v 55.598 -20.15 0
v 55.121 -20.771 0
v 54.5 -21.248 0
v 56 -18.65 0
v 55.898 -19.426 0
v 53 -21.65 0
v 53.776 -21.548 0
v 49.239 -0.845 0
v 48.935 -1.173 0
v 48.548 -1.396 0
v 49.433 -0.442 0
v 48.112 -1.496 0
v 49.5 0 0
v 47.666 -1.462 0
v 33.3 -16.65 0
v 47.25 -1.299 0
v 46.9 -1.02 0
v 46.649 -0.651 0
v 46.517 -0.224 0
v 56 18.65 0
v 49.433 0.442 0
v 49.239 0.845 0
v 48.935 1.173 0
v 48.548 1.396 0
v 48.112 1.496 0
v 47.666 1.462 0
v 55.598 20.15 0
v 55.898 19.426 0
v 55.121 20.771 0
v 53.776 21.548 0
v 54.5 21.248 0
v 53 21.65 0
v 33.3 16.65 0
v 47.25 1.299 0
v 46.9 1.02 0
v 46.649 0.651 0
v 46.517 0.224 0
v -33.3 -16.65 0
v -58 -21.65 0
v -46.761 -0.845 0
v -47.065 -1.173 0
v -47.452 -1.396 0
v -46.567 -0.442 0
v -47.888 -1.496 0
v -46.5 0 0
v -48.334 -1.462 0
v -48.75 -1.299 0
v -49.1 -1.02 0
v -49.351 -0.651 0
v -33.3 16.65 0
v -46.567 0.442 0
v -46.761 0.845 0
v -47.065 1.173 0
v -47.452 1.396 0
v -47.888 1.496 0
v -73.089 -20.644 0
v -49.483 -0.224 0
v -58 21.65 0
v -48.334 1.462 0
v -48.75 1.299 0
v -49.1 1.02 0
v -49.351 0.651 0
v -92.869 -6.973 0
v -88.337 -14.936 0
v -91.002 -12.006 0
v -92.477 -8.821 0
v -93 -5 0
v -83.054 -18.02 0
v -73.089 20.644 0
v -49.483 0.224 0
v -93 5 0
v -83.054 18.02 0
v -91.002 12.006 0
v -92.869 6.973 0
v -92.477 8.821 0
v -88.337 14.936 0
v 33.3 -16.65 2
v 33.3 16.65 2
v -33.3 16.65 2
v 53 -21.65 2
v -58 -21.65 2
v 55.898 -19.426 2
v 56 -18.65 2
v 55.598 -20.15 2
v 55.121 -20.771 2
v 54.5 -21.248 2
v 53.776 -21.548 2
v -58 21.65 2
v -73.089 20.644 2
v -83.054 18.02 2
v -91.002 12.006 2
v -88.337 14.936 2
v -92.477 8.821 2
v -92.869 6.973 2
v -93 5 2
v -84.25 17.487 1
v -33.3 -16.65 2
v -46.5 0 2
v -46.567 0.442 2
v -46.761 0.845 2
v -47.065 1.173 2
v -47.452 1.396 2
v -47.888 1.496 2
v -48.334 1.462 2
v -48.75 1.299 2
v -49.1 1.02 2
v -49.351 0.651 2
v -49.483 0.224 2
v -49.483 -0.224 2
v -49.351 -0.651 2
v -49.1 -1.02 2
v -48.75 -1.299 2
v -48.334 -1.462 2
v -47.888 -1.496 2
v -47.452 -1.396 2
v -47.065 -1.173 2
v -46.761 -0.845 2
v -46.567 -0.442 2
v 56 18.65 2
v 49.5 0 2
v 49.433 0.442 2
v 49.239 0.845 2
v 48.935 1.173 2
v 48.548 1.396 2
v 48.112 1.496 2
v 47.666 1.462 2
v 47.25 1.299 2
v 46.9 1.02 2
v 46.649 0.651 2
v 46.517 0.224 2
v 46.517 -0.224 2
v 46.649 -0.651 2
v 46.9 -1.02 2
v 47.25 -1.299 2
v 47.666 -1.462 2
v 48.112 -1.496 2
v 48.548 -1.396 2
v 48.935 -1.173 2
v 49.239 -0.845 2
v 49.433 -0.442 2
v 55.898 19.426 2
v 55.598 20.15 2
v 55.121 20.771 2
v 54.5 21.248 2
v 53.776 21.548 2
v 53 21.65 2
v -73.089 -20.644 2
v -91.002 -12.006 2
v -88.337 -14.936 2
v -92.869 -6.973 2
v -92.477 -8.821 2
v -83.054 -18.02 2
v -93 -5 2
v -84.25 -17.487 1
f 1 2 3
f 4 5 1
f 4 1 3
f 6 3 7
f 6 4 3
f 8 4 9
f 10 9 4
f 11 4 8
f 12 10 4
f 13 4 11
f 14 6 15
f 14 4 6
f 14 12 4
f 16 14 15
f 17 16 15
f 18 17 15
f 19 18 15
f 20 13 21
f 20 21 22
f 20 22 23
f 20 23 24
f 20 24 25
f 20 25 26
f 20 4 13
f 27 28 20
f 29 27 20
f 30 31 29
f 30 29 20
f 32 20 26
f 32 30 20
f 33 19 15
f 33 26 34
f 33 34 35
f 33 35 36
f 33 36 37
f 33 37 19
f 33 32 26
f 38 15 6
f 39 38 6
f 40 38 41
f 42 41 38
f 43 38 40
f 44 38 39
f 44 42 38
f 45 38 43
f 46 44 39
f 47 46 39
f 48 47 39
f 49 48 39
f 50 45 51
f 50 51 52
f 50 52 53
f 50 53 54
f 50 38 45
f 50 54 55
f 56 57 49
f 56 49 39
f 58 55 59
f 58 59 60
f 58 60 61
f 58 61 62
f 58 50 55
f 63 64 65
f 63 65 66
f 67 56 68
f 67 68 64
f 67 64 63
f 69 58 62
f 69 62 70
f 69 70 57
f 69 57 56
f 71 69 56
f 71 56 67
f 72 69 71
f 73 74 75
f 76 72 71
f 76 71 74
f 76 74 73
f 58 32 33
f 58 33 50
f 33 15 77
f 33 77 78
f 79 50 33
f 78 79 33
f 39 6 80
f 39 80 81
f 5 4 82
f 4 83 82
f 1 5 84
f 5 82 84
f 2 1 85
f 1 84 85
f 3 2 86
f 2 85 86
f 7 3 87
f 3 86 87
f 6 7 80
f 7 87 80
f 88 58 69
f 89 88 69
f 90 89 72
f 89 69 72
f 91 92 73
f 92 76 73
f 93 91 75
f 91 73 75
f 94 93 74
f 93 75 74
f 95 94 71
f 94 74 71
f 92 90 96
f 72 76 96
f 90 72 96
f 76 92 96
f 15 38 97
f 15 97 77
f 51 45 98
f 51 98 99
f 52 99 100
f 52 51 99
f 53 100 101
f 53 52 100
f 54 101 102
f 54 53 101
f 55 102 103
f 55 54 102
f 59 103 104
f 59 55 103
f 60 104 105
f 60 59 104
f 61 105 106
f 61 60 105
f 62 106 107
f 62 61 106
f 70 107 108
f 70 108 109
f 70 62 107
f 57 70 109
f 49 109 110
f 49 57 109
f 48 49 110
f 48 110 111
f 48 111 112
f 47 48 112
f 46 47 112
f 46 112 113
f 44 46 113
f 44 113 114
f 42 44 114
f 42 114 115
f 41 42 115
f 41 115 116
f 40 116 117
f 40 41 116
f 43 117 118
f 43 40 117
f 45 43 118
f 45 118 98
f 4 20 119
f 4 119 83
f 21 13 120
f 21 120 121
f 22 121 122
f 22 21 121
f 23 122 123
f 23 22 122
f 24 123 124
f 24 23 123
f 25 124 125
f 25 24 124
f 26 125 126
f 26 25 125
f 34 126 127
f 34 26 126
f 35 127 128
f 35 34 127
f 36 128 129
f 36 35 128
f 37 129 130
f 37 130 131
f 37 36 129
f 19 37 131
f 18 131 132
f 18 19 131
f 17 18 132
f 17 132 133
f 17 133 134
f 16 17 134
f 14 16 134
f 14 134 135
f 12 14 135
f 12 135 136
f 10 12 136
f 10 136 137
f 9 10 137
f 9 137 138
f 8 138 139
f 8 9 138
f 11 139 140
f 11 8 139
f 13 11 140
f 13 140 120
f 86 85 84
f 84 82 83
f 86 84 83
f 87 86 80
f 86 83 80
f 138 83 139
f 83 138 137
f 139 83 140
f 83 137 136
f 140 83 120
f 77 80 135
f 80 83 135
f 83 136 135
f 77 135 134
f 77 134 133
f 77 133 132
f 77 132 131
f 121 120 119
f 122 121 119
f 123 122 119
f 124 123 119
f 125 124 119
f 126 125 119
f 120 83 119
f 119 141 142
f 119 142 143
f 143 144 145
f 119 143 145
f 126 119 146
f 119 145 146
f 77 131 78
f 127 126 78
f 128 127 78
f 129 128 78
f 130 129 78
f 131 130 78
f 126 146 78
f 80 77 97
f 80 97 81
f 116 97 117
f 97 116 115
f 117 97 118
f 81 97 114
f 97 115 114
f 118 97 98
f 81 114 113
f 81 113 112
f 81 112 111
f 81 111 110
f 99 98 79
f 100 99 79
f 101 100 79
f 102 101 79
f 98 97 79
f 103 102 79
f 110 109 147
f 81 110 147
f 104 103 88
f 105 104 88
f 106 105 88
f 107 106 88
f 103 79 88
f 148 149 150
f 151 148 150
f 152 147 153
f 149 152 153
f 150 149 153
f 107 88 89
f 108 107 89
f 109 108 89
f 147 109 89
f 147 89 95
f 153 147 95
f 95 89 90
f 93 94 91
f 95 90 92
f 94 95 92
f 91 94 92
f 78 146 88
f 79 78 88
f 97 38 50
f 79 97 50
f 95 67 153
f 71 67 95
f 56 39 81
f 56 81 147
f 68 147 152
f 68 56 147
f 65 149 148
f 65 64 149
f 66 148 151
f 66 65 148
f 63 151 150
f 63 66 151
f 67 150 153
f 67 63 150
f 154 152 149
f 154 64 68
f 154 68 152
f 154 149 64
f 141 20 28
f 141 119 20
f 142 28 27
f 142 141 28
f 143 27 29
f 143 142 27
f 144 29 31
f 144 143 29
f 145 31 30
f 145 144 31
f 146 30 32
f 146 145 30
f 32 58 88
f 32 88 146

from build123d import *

# Parameters (mm, degrees)
SKETCH_W     = 66.6
SKETCH_H     = 33.3
SKETCH_R     = 1.5
PAD001_DEPTH = 2
FILLET001_R  = 3
FILLET002_R  = 3


with BuildPart() as part:
    # Sketch → Pad001 (new body)
    with BuildSketch(Plane.XY):
        with BuildLine():
            Line((-58, 21.65), (56, 21.65))
            Line((56, 21.65), (56, -21.65))
            Line((56, -21.65), (-58, -21.65))
            add(Edge.make_bspline(
                [(-58, -21.65), (-93, -21.65), (-93, -5)],
                knots=[0, 0, 0, 1, 1, 1], degree=2))
            Line((-93, -5), (-93, 5))
            add(Edge.make_bspline(
                [(-58, 21.65), (-93, 21.65), (-93, 5)],
                knots=[0, 0, 0, 1, 1, 1], degree=2))
        make_face()
        Rectangle(SKETCH_W, SKETCH_H, mode=Mode.SUBTRACT)
        with Locations((-48, 0)):
            Circle(SKETCH_R, mode=Mode.SUBTRACT)
        with Locations((48, 0)):
            Circle(SKETCH_R, mode=Mode.SUBTRACT)
    extrude(amount=PAD001_DEPTH)

    # Fillet001
    fillet001_edges = [part.edges().sort_by_distance(p)[0] for p in [
        (56, -21.65, 1),
    ]]
    fillet(fillet001_edges, radius=FILLET001_R)

    # Fillet002
    fillet002_edges = [part.edges().sort_by_distance(p)[0] for p in [
        (56, 21.65, 1),
    ]]
    fillet(fillet002_edges, radius=FILLET002_R)


solid = part.part
